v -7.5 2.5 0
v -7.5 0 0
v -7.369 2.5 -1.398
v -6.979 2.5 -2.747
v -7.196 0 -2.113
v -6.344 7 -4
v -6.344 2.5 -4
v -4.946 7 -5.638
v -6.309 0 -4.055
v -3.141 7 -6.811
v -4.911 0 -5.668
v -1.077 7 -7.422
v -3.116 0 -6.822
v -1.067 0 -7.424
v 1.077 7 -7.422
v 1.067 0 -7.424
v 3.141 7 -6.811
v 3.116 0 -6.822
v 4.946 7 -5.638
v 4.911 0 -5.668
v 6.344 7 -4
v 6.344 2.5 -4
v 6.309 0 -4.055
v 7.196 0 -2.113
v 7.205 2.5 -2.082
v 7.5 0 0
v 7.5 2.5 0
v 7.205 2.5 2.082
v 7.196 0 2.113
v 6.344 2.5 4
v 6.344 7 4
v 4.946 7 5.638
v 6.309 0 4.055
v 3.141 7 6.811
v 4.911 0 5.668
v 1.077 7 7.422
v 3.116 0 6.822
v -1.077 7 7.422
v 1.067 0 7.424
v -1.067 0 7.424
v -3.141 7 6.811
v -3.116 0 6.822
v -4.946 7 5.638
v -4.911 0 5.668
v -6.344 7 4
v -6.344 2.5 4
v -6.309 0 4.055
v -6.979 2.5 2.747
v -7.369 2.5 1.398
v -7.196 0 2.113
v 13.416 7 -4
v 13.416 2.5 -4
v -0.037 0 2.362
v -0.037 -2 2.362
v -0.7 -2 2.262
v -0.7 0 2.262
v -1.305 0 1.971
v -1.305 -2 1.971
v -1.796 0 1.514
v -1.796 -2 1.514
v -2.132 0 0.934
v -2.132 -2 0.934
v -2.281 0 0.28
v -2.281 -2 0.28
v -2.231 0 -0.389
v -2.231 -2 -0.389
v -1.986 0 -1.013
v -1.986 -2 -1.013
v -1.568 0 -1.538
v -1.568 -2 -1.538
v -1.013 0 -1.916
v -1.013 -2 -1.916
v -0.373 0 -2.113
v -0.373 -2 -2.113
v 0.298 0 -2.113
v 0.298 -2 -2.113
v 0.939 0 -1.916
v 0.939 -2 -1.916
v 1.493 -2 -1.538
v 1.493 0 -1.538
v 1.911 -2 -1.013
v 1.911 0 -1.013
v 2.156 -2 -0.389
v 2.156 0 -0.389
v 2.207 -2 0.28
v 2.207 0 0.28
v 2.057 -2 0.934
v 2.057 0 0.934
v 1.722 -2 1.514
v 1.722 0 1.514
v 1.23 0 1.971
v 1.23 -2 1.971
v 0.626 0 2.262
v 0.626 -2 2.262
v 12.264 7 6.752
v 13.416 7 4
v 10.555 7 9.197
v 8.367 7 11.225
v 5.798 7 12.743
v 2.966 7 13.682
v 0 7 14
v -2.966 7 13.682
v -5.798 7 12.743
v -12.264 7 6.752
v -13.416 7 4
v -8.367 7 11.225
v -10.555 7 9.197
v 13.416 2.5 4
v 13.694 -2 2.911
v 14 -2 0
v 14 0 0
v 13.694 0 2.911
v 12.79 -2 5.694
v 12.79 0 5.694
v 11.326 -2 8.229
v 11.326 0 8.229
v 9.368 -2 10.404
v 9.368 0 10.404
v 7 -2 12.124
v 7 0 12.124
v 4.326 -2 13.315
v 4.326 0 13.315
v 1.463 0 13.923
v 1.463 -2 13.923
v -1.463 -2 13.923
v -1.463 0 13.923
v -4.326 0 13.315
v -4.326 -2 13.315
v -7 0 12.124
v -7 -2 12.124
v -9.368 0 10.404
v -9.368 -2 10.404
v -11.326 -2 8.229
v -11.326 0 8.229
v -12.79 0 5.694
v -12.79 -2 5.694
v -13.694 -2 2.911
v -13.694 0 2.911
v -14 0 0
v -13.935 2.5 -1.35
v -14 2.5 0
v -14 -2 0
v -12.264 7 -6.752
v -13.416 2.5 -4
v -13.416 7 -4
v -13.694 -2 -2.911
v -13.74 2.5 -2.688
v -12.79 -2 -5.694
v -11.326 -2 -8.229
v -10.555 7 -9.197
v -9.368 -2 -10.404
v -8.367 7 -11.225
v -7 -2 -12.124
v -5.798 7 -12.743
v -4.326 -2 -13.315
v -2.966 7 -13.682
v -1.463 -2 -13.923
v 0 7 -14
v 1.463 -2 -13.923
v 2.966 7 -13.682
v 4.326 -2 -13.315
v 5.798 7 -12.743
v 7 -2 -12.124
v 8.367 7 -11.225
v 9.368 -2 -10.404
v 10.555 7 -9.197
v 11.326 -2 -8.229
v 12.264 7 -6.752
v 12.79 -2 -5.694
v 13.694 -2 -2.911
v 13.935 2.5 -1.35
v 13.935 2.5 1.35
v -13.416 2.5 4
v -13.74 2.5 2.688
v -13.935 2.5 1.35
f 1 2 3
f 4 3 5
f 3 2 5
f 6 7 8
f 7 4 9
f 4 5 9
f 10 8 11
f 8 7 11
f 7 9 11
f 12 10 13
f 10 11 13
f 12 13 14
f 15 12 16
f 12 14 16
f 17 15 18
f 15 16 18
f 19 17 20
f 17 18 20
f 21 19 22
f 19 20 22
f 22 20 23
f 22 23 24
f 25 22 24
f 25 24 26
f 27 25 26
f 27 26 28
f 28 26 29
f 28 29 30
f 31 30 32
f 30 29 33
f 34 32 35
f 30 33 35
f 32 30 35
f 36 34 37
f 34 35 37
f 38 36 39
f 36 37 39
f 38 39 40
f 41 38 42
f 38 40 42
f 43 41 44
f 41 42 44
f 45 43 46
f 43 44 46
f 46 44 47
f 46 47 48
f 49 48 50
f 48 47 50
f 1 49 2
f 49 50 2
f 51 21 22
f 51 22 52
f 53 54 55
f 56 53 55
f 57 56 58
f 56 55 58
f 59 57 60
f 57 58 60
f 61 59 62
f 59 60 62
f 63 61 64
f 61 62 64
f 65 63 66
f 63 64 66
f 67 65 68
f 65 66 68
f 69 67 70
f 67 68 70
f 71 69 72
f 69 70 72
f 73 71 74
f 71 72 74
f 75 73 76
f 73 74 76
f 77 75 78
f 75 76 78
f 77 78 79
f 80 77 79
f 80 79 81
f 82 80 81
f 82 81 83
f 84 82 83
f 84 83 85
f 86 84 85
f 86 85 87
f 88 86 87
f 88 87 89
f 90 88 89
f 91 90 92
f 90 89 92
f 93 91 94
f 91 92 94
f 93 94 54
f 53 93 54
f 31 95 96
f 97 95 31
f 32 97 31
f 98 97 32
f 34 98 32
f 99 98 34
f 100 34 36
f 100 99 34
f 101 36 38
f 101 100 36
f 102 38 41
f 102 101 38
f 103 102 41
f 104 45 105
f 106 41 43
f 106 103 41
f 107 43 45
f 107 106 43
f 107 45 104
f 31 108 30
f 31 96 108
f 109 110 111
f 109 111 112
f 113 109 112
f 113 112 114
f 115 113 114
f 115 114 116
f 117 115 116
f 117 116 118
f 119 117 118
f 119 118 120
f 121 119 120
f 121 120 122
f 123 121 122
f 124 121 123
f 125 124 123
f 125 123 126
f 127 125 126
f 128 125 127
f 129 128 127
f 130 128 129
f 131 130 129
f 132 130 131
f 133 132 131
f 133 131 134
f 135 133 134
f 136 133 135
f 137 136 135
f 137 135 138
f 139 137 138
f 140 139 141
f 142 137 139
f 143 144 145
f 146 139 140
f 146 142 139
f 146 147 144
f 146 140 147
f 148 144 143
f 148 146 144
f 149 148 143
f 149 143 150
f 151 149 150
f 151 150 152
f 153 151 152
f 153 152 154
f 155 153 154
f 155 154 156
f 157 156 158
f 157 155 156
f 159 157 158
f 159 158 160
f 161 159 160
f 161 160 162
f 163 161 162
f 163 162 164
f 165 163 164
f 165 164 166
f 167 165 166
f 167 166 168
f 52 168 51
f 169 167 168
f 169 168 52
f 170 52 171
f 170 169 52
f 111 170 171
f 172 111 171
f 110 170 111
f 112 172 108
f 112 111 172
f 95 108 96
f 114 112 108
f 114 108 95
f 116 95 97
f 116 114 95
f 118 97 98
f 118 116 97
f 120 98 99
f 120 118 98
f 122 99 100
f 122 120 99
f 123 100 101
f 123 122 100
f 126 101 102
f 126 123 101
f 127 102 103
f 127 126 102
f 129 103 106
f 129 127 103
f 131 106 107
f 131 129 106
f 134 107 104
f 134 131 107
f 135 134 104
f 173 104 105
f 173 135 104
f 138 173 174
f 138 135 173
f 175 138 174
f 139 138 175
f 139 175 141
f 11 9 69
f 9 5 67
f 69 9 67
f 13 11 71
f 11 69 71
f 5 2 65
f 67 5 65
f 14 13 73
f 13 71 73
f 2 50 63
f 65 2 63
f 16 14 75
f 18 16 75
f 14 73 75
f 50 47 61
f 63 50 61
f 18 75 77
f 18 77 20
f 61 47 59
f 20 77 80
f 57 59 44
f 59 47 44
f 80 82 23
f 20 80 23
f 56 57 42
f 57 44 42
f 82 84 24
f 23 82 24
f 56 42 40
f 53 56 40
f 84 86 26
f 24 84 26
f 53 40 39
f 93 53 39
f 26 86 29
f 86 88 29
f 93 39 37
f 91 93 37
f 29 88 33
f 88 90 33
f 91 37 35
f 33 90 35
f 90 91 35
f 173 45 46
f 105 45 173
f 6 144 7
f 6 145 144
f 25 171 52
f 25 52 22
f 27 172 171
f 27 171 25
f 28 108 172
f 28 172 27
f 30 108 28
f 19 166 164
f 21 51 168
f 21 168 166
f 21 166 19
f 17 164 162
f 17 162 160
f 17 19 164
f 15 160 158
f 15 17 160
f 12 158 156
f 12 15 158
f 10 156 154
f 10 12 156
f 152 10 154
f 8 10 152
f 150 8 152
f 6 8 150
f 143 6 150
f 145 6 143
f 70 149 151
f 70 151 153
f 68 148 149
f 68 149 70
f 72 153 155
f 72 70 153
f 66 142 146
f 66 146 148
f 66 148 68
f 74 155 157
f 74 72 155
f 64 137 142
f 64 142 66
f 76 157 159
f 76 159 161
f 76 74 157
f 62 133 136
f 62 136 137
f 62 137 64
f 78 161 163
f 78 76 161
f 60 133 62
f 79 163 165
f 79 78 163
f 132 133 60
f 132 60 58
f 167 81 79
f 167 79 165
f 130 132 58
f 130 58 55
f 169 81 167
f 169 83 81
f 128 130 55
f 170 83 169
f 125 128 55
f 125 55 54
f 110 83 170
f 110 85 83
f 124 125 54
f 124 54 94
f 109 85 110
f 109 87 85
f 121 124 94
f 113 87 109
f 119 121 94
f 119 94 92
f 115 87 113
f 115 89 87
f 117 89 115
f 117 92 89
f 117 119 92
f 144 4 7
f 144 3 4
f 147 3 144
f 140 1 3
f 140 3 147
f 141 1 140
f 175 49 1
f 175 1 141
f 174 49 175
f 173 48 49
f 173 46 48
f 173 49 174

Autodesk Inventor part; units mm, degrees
ref_plane "YZ Plane" through (0, 0, 0) normal (1, 0, 0) x (0, 1, 0)
ref_plane "XZ Plane" through (0, 0, 0) normal (0, 1, 0) x (-1, 0, 0)
ref_plane "XY Plane" through (0, 0, 0) normal (0, 0, 1) x (1, 0, 0)
sketch "Sketch1" plane through (0, 0, 0) normal (0, 1, 0) x (-1, 0, 0)
  circle A0 centre (0, 0) radius 14
  circle A1 centre (0, 0) radius 7.5
  dimension "d0" = 28
  dimension "d1" = 15
extrude "Extrusion1" add sketch "Sketch1" along normal blind 7
sketch "Sketch2" plane through (0, 7, 0) normal (0, 1, 0) x (1, 0, 0)
  line L0 (14, -4) -> (-14, -4)
  line L1 (-14, -4) -> (-14, 4)
  line L2 (-14, 4) -> (14, 4)
  line L3 (14, 4) -> (14, -4)
  line L4 (14, -4) -> (-14, 4) construction
  line L5 (-14, -4) -> (14, 4) construction
  line L6 (-0.5, 5) -> (0.5, 5)
  line L7 (0.5, 5) -> (0.5, -5)
  line L8 (0.5, -5) -> (-0.5, -5)
  line L9 (-0.5, -5) -> (-0.5, 5)
  line L10 (-0.5, 5) -> (0.5, -5) construction
  line L11 (0.5, 5) -> (-0.5, -5) construction
  point P0 (0, 0)
  dimension "d4" = 28
  dimension "d5" = 8
extrude "Extrusion2" cut sketch "Sketch2" against normal blind 8 contours L0 L7 L2 L3 | L0 L9 L2 L7 | L0 L1 L2 L9
sketch "Sketch3" plane through (0, 0, 0) normal (0, -1, 0) x (1, 0, 0)
  circle A0 centre (0, 0) radius 14
  dimension "d17" = 28
extrude "Extrusion3" add sketch "Sketch3" along normal blind 2
sketch "Sketch5" plane through (0, 0, 0) normal (0, 1, 0) x (1, 0, 0)
  point P0 (0, 0)
  point P1 (-0.0372, -0.1116)
hole "Hole2" at (-0.0372, 0, 0.1116) direction (0, -1, 0) diameter 4.5 end through all clearance for "Hex Head Machine Screw" size "M4" standard "Ansi Metric M Profile"
extrude "Extrusion4" add sketch "Sketch1" along normal blind 2.5
properties part number "magneticslotV1"
